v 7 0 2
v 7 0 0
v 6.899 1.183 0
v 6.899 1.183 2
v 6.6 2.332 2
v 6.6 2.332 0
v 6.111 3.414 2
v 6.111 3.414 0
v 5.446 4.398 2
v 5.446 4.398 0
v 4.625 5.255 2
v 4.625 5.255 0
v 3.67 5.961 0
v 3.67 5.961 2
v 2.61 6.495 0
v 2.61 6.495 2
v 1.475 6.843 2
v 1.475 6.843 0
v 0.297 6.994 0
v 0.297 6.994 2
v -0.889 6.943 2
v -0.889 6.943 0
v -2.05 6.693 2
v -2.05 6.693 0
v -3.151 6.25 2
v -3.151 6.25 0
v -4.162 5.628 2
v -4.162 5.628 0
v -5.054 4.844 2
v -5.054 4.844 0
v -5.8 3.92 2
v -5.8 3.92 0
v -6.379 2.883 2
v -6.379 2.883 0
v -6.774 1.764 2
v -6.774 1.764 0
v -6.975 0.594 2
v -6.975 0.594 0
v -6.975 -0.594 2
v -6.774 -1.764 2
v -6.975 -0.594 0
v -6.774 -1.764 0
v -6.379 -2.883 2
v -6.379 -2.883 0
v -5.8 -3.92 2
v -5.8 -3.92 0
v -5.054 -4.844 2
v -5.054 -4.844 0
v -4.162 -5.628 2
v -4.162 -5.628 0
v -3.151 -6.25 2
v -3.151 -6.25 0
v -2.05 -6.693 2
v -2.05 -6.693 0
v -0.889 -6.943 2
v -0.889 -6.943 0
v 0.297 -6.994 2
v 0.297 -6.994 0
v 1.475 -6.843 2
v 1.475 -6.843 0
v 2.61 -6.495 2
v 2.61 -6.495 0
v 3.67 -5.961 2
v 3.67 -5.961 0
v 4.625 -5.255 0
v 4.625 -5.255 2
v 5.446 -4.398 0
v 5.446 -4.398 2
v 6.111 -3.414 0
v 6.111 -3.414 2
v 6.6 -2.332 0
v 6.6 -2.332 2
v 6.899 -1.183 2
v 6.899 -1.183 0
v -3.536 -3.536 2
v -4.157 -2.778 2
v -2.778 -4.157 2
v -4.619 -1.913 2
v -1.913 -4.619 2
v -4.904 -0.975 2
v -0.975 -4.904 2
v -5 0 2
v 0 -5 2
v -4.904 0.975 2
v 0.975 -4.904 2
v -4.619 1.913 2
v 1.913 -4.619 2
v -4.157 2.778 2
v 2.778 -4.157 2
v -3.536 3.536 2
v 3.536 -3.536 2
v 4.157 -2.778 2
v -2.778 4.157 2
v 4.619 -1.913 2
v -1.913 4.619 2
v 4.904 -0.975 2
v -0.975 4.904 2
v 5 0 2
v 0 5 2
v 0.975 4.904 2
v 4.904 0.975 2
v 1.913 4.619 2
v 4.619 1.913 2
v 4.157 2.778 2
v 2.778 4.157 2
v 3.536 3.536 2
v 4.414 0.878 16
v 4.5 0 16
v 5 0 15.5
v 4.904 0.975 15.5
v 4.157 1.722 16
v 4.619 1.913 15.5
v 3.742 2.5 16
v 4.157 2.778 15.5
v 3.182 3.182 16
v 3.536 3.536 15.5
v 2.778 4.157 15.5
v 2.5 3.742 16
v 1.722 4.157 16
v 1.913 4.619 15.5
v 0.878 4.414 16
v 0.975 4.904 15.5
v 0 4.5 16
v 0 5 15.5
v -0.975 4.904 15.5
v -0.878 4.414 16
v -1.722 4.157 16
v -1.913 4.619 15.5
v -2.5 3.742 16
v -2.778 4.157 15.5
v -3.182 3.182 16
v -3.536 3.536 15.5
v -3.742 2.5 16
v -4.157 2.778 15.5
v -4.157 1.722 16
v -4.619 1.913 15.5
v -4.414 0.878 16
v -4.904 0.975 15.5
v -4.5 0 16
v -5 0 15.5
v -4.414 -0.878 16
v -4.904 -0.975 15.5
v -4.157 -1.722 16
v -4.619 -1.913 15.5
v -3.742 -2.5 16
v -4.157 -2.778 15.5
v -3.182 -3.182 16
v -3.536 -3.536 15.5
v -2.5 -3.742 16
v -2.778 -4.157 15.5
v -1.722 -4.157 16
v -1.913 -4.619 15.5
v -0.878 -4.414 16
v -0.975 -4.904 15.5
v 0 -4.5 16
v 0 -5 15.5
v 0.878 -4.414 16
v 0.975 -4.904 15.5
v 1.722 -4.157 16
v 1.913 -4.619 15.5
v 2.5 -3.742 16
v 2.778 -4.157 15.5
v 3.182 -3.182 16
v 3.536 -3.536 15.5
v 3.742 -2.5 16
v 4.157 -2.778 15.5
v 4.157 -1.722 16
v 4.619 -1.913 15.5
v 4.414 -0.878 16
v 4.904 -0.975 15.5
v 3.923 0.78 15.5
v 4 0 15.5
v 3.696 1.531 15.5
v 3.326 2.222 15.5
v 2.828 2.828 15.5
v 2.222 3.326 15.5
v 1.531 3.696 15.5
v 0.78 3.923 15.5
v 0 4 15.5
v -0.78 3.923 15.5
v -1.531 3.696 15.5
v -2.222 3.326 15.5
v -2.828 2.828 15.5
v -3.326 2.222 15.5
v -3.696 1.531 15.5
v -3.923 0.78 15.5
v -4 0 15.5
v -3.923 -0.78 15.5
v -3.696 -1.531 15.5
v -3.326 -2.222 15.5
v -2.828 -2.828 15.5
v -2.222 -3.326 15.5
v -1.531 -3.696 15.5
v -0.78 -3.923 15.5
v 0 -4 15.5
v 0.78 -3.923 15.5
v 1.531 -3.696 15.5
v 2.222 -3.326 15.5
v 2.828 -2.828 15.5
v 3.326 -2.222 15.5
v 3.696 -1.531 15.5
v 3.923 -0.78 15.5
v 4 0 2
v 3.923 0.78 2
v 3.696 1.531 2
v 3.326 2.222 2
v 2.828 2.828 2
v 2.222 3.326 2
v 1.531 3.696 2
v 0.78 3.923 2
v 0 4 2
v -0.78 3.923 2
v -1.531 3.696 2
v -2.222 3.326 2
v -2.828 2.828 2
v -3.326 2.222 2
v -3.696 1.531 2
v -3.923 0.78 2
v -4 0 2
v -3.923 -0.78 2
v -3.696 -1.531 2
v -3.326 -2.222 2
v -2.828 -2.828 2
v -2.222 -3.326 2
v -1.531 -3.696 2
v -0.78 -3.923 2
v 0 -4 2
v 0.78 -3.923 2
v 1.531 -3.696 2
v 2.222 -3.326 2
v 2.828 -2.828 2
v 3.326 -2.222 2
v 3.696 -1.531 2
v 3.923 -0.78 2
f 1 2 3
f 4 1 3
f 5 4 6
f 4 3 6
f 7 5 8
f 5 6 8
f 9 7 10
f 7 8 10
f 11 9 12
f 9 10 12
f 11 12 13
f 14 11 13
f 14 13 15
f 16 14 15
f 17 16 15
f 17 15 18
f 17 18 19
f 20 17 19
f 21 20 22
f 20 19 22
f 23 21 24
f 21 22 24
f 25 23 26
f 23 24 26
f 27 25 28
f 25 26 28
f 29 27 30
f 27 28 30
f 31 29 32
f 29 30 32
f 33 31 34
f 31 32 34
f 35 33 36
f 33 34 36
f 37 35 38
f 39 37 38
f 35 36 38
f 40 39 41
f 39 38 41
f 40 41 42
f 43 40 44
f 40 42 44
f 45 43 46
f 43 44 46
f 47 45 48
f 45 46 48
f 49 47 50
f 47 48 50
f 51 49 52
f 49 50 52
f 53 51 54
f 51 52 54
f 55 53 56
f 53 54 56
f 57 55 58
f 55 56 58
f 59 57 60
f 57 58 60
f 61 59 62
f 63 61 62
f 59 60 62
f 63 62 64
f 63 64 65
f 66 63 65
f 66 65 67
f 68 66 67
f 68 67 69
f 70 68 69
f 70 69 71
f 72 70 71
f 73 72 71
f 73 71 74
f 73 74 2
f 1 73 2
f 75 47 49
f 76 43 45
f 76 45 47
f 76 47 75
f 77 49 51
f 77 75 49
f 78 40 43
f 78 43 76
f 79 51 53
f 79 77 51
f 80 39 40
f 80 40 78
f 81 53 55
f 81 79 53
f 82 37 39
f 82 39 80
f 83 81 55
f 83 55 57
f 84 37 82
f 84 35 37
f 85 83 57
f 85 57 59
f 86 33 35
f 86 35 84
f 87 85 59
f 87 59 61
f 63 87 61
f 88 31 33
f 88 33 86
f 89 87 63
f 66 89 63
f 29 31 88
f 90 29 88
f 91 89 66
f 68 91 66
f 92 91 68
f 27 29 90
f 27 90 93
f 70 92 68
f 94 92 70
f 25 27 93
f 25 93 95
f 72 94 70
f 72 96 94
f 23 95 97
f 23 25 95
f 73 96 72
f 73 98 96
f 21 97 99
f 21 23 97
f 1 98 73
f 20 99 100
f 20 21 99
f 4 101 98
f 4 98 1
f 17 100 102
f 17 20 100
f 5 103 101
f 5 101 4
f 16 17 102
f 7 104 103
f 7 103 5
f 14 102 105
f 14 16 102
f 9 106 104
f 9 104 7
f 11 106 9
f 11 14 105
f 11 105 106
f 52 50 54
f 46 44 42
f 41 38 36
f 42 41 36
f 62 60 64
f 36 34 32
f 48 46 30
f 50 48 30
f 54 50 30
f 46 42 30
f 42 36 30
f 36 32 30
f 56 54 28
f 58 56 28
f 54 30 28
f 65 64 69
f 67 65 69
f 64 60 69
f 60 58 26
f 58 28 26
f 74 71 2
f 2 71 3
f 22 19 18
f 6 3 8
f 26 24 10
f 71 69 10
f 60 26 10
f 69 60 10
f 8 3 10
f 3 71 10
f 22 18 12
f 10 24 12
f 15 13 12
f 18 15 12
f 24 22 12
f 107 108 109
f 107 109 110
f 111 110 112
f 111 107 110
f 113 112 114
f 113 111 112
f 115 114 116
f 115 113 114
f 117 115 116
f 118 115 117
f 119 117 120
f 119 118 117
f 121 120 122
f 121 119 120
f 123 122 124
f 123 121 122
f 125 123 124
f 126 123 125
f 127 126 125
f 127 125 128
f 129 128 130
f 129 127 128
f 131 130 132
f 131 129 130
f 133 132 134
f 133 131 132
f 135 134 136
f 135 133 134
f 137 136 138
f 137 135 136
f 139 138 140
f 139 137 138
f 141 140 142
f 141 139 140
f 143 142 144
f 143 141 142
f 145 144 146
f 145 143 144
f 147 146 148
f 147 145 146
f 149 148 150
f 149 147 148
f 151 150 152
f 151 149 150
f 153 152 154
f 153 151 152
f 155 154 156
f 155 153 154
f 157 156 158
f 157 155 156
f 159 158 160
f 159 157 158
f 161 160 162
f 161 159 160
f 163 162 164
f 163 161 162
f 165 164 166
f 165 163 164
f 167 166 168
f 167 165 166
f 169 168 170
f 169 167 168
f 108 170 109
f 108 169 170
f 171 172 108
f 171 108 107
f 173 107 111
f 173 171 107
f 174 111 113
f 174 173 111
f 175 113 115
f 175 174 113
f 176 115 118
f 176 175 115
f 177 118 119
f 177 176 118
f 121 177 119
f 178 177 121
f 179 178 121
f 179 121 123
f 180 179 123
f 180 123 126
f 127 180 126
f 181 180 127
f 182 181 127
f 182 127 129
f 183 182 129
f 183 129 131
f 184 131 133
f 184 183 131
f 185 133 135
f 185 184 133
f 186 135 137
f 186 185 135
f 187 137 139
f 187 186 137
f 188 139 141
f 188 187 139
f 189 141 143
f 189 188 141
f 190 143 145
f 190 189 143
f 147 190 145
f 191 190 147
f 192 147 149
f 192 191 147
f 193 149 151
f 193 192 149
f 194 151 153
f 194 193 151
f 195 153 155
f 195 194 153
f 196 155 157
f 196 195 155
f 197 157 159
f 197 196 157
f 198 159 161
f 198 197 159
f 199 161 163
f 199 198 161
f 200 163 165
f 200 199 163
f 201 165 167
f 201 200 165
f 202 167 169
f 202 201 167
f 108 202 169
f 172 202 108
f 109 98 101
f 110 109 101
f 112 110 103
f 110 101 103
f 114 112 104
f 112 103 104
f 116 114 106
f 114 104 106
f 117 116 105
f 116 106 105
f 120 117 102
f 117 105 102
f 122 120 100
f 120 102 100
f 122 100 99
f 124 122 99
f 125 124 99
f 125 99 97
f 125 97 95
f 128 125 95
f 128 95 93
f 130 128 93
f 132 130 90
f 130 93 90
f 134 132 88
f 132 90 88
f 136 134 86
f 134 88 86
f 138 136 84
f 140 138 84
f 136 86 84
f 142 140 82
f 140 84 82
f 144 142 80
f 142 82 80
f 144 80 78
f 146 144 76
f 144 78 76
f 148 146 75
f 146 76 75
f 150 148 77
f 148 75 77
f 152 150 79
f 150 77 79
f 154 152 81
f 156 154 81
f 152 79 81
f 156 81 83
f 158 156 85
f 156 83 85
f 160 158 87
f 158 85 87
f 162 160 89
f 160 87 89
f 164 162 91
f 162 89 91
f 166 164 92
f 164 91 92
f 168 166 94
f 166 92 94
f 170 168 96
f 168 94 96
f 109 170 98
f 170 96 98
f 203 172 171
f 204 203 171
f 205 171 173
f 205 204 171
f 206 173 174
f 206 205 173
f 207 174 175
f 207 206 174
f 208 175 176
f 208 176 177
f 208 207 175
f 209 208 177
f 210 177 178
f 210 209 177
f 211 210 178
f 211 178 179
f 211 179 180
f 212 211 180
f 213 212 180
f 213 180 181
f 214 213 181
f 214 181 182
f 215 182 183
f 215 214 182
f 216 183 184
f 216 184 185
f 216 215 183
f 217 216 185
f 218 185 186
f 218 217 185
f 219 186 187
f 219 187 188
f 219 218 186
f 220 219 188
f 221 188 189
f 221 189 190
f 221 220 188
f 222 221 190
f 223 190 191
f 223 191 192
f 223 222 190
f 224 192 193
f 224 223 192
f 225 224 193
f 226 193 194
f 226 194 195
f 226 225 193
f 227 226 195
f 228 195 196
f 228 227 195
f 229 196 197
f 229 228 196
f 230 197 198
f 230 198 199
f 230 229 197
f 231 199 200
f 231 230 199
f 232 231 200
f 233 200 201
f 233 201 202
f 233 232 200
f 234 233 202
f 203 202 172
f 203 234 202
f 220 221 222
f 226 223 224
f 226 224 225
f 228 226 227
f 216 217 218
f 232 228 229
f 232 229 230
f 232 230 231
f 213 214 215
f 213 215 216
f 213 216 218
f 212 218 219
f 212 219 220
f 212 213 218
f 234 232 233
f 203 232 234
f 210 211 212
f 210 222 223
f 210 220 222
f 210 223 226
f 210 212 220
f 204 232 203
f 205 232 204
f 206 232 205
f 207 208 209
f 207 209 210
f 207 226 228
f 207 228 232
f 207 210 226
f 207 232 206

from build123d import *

# Parameters (mm, degrees)
F0_R     = 7
F1_DEPTH = 2
F2_R     = 5
F2_R_2   = 4
F3_DEPTH = 14
F4_SIZE  = 0.49999


# Not quite as in the source:
# - a fillet or chamfer is up to 0.001 mm smaller than in the source, because OpenCascade refuses the exact size


with BuildPart() as f1:
    # F0 (on Top) → F1 (new body)
    with BuildSketch(Plane.XY):
        Circle(F0_R)
    extrude(amount=F1_DEPTH)

    # F2 (on face) → F3 (join)
    with BuildSketch(Plane.XY.offset(2)):
        Circle(F2_R)
        Circle(F2_R_2, mode=Mode.SUBTRACT)
    extrude(amount=F3_DEPTH)

    # F4 (size 0.5 in the source; OpenCascade refuses exactly that, so slightly less here)
    f4_edges = [f1.edges().sort_by_distance(p)[0] for p in [
        (-5, 0, 16),
        (-4, 0, 16),
    ]]
    chamfer(f4_edges, length=F4_SIZE)


solid = f1.part
